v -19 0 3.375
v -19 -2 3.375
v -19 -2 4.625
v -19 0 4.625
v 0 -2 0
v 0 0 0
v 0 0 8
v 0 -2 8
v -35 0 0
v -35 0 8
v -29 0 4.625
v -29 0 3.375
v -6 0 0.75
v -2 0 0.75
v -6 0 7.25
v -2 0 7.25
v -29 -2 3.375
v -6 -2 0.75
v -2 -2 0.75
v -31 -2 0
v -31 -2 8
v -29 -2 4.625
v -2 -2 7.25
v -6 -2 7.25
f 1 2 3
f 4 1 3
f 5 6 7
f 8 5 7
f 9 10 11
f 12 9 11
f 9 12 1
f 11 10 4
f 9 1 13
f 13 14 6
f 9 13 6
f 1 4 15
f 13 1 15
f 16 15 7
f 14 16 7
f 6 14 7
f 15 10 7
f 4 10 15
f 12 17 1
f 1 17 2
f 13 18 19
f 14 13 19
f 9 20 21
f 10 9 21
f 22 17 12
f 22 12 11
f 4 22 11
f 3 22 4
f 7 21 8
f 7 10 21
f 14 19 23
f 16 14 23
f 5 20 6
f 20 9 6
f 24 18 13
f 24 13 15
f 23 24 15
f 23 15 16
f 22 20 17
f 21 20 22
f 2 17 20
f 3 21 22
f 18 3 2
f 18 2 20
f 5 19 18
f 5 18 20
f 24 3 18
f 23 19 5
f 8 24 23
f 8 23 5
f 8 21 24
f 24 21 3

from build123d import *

# Parameters (mm, degrees)
F0_W     = 35
F0_H     = 8
F1_DEPTH = 2
F2_SIZE2 = 3.99999
F2_SIZE  = 1.99999
F3_W     = 4
F3_H     = 6.5
F4_DEPTH = 2
F5_W     = 10
F5_H     = 1.25
F6_DEPTH = 2


# Not quite as in the source:
# - a fillet or chamfer is up to 0.001 mm smaller than in the source, because OpenCascade refuses the exact size


with BuildPart() as f1:
    # F0 (on Front) → F1 (new body)
    with BuildSketch(Plane.XZ):
        with Locations((-17.5, 4)):
            Rectangle(F0_W, F0_H)
    extrude(amount=F1_DEPTH)

    # F2 (size 2 and 4 in the source; OpenCascade refuses exactly that, so slightly less here)
    f2_edges = [f1.edges().sort_by_distance(p)[0] for p in [
        (-35, -2, 4),
    ]]
    f2_side = f1.faces().sort_by_distance((-35, -1, 4))[0]
    chamfer(f2_edges, length=F2_SIZE, length2=F2_SIZE2, reference=f2_side)

    # F3 (on face) → F4 (cut)
    with BuildSketch(Plane.XZ.offset(2)):
        with Locations((-4, 4)):
            Rectangle(F3_W, F3_H)
    extrude(amount=-F4_DEPTH, mode=Mode.SUBTRACT)

    # F5 (on face) → F6 (cut)
    with BuildSketch(Plane.XZ.offset(2)):
        with Locations((-24, 4)):
            Rectangle(F5_W, F5_H)
    extrude(amount=-F6_DEPTH, mode=Mode.SUBTRACT)


solid = f1.part
